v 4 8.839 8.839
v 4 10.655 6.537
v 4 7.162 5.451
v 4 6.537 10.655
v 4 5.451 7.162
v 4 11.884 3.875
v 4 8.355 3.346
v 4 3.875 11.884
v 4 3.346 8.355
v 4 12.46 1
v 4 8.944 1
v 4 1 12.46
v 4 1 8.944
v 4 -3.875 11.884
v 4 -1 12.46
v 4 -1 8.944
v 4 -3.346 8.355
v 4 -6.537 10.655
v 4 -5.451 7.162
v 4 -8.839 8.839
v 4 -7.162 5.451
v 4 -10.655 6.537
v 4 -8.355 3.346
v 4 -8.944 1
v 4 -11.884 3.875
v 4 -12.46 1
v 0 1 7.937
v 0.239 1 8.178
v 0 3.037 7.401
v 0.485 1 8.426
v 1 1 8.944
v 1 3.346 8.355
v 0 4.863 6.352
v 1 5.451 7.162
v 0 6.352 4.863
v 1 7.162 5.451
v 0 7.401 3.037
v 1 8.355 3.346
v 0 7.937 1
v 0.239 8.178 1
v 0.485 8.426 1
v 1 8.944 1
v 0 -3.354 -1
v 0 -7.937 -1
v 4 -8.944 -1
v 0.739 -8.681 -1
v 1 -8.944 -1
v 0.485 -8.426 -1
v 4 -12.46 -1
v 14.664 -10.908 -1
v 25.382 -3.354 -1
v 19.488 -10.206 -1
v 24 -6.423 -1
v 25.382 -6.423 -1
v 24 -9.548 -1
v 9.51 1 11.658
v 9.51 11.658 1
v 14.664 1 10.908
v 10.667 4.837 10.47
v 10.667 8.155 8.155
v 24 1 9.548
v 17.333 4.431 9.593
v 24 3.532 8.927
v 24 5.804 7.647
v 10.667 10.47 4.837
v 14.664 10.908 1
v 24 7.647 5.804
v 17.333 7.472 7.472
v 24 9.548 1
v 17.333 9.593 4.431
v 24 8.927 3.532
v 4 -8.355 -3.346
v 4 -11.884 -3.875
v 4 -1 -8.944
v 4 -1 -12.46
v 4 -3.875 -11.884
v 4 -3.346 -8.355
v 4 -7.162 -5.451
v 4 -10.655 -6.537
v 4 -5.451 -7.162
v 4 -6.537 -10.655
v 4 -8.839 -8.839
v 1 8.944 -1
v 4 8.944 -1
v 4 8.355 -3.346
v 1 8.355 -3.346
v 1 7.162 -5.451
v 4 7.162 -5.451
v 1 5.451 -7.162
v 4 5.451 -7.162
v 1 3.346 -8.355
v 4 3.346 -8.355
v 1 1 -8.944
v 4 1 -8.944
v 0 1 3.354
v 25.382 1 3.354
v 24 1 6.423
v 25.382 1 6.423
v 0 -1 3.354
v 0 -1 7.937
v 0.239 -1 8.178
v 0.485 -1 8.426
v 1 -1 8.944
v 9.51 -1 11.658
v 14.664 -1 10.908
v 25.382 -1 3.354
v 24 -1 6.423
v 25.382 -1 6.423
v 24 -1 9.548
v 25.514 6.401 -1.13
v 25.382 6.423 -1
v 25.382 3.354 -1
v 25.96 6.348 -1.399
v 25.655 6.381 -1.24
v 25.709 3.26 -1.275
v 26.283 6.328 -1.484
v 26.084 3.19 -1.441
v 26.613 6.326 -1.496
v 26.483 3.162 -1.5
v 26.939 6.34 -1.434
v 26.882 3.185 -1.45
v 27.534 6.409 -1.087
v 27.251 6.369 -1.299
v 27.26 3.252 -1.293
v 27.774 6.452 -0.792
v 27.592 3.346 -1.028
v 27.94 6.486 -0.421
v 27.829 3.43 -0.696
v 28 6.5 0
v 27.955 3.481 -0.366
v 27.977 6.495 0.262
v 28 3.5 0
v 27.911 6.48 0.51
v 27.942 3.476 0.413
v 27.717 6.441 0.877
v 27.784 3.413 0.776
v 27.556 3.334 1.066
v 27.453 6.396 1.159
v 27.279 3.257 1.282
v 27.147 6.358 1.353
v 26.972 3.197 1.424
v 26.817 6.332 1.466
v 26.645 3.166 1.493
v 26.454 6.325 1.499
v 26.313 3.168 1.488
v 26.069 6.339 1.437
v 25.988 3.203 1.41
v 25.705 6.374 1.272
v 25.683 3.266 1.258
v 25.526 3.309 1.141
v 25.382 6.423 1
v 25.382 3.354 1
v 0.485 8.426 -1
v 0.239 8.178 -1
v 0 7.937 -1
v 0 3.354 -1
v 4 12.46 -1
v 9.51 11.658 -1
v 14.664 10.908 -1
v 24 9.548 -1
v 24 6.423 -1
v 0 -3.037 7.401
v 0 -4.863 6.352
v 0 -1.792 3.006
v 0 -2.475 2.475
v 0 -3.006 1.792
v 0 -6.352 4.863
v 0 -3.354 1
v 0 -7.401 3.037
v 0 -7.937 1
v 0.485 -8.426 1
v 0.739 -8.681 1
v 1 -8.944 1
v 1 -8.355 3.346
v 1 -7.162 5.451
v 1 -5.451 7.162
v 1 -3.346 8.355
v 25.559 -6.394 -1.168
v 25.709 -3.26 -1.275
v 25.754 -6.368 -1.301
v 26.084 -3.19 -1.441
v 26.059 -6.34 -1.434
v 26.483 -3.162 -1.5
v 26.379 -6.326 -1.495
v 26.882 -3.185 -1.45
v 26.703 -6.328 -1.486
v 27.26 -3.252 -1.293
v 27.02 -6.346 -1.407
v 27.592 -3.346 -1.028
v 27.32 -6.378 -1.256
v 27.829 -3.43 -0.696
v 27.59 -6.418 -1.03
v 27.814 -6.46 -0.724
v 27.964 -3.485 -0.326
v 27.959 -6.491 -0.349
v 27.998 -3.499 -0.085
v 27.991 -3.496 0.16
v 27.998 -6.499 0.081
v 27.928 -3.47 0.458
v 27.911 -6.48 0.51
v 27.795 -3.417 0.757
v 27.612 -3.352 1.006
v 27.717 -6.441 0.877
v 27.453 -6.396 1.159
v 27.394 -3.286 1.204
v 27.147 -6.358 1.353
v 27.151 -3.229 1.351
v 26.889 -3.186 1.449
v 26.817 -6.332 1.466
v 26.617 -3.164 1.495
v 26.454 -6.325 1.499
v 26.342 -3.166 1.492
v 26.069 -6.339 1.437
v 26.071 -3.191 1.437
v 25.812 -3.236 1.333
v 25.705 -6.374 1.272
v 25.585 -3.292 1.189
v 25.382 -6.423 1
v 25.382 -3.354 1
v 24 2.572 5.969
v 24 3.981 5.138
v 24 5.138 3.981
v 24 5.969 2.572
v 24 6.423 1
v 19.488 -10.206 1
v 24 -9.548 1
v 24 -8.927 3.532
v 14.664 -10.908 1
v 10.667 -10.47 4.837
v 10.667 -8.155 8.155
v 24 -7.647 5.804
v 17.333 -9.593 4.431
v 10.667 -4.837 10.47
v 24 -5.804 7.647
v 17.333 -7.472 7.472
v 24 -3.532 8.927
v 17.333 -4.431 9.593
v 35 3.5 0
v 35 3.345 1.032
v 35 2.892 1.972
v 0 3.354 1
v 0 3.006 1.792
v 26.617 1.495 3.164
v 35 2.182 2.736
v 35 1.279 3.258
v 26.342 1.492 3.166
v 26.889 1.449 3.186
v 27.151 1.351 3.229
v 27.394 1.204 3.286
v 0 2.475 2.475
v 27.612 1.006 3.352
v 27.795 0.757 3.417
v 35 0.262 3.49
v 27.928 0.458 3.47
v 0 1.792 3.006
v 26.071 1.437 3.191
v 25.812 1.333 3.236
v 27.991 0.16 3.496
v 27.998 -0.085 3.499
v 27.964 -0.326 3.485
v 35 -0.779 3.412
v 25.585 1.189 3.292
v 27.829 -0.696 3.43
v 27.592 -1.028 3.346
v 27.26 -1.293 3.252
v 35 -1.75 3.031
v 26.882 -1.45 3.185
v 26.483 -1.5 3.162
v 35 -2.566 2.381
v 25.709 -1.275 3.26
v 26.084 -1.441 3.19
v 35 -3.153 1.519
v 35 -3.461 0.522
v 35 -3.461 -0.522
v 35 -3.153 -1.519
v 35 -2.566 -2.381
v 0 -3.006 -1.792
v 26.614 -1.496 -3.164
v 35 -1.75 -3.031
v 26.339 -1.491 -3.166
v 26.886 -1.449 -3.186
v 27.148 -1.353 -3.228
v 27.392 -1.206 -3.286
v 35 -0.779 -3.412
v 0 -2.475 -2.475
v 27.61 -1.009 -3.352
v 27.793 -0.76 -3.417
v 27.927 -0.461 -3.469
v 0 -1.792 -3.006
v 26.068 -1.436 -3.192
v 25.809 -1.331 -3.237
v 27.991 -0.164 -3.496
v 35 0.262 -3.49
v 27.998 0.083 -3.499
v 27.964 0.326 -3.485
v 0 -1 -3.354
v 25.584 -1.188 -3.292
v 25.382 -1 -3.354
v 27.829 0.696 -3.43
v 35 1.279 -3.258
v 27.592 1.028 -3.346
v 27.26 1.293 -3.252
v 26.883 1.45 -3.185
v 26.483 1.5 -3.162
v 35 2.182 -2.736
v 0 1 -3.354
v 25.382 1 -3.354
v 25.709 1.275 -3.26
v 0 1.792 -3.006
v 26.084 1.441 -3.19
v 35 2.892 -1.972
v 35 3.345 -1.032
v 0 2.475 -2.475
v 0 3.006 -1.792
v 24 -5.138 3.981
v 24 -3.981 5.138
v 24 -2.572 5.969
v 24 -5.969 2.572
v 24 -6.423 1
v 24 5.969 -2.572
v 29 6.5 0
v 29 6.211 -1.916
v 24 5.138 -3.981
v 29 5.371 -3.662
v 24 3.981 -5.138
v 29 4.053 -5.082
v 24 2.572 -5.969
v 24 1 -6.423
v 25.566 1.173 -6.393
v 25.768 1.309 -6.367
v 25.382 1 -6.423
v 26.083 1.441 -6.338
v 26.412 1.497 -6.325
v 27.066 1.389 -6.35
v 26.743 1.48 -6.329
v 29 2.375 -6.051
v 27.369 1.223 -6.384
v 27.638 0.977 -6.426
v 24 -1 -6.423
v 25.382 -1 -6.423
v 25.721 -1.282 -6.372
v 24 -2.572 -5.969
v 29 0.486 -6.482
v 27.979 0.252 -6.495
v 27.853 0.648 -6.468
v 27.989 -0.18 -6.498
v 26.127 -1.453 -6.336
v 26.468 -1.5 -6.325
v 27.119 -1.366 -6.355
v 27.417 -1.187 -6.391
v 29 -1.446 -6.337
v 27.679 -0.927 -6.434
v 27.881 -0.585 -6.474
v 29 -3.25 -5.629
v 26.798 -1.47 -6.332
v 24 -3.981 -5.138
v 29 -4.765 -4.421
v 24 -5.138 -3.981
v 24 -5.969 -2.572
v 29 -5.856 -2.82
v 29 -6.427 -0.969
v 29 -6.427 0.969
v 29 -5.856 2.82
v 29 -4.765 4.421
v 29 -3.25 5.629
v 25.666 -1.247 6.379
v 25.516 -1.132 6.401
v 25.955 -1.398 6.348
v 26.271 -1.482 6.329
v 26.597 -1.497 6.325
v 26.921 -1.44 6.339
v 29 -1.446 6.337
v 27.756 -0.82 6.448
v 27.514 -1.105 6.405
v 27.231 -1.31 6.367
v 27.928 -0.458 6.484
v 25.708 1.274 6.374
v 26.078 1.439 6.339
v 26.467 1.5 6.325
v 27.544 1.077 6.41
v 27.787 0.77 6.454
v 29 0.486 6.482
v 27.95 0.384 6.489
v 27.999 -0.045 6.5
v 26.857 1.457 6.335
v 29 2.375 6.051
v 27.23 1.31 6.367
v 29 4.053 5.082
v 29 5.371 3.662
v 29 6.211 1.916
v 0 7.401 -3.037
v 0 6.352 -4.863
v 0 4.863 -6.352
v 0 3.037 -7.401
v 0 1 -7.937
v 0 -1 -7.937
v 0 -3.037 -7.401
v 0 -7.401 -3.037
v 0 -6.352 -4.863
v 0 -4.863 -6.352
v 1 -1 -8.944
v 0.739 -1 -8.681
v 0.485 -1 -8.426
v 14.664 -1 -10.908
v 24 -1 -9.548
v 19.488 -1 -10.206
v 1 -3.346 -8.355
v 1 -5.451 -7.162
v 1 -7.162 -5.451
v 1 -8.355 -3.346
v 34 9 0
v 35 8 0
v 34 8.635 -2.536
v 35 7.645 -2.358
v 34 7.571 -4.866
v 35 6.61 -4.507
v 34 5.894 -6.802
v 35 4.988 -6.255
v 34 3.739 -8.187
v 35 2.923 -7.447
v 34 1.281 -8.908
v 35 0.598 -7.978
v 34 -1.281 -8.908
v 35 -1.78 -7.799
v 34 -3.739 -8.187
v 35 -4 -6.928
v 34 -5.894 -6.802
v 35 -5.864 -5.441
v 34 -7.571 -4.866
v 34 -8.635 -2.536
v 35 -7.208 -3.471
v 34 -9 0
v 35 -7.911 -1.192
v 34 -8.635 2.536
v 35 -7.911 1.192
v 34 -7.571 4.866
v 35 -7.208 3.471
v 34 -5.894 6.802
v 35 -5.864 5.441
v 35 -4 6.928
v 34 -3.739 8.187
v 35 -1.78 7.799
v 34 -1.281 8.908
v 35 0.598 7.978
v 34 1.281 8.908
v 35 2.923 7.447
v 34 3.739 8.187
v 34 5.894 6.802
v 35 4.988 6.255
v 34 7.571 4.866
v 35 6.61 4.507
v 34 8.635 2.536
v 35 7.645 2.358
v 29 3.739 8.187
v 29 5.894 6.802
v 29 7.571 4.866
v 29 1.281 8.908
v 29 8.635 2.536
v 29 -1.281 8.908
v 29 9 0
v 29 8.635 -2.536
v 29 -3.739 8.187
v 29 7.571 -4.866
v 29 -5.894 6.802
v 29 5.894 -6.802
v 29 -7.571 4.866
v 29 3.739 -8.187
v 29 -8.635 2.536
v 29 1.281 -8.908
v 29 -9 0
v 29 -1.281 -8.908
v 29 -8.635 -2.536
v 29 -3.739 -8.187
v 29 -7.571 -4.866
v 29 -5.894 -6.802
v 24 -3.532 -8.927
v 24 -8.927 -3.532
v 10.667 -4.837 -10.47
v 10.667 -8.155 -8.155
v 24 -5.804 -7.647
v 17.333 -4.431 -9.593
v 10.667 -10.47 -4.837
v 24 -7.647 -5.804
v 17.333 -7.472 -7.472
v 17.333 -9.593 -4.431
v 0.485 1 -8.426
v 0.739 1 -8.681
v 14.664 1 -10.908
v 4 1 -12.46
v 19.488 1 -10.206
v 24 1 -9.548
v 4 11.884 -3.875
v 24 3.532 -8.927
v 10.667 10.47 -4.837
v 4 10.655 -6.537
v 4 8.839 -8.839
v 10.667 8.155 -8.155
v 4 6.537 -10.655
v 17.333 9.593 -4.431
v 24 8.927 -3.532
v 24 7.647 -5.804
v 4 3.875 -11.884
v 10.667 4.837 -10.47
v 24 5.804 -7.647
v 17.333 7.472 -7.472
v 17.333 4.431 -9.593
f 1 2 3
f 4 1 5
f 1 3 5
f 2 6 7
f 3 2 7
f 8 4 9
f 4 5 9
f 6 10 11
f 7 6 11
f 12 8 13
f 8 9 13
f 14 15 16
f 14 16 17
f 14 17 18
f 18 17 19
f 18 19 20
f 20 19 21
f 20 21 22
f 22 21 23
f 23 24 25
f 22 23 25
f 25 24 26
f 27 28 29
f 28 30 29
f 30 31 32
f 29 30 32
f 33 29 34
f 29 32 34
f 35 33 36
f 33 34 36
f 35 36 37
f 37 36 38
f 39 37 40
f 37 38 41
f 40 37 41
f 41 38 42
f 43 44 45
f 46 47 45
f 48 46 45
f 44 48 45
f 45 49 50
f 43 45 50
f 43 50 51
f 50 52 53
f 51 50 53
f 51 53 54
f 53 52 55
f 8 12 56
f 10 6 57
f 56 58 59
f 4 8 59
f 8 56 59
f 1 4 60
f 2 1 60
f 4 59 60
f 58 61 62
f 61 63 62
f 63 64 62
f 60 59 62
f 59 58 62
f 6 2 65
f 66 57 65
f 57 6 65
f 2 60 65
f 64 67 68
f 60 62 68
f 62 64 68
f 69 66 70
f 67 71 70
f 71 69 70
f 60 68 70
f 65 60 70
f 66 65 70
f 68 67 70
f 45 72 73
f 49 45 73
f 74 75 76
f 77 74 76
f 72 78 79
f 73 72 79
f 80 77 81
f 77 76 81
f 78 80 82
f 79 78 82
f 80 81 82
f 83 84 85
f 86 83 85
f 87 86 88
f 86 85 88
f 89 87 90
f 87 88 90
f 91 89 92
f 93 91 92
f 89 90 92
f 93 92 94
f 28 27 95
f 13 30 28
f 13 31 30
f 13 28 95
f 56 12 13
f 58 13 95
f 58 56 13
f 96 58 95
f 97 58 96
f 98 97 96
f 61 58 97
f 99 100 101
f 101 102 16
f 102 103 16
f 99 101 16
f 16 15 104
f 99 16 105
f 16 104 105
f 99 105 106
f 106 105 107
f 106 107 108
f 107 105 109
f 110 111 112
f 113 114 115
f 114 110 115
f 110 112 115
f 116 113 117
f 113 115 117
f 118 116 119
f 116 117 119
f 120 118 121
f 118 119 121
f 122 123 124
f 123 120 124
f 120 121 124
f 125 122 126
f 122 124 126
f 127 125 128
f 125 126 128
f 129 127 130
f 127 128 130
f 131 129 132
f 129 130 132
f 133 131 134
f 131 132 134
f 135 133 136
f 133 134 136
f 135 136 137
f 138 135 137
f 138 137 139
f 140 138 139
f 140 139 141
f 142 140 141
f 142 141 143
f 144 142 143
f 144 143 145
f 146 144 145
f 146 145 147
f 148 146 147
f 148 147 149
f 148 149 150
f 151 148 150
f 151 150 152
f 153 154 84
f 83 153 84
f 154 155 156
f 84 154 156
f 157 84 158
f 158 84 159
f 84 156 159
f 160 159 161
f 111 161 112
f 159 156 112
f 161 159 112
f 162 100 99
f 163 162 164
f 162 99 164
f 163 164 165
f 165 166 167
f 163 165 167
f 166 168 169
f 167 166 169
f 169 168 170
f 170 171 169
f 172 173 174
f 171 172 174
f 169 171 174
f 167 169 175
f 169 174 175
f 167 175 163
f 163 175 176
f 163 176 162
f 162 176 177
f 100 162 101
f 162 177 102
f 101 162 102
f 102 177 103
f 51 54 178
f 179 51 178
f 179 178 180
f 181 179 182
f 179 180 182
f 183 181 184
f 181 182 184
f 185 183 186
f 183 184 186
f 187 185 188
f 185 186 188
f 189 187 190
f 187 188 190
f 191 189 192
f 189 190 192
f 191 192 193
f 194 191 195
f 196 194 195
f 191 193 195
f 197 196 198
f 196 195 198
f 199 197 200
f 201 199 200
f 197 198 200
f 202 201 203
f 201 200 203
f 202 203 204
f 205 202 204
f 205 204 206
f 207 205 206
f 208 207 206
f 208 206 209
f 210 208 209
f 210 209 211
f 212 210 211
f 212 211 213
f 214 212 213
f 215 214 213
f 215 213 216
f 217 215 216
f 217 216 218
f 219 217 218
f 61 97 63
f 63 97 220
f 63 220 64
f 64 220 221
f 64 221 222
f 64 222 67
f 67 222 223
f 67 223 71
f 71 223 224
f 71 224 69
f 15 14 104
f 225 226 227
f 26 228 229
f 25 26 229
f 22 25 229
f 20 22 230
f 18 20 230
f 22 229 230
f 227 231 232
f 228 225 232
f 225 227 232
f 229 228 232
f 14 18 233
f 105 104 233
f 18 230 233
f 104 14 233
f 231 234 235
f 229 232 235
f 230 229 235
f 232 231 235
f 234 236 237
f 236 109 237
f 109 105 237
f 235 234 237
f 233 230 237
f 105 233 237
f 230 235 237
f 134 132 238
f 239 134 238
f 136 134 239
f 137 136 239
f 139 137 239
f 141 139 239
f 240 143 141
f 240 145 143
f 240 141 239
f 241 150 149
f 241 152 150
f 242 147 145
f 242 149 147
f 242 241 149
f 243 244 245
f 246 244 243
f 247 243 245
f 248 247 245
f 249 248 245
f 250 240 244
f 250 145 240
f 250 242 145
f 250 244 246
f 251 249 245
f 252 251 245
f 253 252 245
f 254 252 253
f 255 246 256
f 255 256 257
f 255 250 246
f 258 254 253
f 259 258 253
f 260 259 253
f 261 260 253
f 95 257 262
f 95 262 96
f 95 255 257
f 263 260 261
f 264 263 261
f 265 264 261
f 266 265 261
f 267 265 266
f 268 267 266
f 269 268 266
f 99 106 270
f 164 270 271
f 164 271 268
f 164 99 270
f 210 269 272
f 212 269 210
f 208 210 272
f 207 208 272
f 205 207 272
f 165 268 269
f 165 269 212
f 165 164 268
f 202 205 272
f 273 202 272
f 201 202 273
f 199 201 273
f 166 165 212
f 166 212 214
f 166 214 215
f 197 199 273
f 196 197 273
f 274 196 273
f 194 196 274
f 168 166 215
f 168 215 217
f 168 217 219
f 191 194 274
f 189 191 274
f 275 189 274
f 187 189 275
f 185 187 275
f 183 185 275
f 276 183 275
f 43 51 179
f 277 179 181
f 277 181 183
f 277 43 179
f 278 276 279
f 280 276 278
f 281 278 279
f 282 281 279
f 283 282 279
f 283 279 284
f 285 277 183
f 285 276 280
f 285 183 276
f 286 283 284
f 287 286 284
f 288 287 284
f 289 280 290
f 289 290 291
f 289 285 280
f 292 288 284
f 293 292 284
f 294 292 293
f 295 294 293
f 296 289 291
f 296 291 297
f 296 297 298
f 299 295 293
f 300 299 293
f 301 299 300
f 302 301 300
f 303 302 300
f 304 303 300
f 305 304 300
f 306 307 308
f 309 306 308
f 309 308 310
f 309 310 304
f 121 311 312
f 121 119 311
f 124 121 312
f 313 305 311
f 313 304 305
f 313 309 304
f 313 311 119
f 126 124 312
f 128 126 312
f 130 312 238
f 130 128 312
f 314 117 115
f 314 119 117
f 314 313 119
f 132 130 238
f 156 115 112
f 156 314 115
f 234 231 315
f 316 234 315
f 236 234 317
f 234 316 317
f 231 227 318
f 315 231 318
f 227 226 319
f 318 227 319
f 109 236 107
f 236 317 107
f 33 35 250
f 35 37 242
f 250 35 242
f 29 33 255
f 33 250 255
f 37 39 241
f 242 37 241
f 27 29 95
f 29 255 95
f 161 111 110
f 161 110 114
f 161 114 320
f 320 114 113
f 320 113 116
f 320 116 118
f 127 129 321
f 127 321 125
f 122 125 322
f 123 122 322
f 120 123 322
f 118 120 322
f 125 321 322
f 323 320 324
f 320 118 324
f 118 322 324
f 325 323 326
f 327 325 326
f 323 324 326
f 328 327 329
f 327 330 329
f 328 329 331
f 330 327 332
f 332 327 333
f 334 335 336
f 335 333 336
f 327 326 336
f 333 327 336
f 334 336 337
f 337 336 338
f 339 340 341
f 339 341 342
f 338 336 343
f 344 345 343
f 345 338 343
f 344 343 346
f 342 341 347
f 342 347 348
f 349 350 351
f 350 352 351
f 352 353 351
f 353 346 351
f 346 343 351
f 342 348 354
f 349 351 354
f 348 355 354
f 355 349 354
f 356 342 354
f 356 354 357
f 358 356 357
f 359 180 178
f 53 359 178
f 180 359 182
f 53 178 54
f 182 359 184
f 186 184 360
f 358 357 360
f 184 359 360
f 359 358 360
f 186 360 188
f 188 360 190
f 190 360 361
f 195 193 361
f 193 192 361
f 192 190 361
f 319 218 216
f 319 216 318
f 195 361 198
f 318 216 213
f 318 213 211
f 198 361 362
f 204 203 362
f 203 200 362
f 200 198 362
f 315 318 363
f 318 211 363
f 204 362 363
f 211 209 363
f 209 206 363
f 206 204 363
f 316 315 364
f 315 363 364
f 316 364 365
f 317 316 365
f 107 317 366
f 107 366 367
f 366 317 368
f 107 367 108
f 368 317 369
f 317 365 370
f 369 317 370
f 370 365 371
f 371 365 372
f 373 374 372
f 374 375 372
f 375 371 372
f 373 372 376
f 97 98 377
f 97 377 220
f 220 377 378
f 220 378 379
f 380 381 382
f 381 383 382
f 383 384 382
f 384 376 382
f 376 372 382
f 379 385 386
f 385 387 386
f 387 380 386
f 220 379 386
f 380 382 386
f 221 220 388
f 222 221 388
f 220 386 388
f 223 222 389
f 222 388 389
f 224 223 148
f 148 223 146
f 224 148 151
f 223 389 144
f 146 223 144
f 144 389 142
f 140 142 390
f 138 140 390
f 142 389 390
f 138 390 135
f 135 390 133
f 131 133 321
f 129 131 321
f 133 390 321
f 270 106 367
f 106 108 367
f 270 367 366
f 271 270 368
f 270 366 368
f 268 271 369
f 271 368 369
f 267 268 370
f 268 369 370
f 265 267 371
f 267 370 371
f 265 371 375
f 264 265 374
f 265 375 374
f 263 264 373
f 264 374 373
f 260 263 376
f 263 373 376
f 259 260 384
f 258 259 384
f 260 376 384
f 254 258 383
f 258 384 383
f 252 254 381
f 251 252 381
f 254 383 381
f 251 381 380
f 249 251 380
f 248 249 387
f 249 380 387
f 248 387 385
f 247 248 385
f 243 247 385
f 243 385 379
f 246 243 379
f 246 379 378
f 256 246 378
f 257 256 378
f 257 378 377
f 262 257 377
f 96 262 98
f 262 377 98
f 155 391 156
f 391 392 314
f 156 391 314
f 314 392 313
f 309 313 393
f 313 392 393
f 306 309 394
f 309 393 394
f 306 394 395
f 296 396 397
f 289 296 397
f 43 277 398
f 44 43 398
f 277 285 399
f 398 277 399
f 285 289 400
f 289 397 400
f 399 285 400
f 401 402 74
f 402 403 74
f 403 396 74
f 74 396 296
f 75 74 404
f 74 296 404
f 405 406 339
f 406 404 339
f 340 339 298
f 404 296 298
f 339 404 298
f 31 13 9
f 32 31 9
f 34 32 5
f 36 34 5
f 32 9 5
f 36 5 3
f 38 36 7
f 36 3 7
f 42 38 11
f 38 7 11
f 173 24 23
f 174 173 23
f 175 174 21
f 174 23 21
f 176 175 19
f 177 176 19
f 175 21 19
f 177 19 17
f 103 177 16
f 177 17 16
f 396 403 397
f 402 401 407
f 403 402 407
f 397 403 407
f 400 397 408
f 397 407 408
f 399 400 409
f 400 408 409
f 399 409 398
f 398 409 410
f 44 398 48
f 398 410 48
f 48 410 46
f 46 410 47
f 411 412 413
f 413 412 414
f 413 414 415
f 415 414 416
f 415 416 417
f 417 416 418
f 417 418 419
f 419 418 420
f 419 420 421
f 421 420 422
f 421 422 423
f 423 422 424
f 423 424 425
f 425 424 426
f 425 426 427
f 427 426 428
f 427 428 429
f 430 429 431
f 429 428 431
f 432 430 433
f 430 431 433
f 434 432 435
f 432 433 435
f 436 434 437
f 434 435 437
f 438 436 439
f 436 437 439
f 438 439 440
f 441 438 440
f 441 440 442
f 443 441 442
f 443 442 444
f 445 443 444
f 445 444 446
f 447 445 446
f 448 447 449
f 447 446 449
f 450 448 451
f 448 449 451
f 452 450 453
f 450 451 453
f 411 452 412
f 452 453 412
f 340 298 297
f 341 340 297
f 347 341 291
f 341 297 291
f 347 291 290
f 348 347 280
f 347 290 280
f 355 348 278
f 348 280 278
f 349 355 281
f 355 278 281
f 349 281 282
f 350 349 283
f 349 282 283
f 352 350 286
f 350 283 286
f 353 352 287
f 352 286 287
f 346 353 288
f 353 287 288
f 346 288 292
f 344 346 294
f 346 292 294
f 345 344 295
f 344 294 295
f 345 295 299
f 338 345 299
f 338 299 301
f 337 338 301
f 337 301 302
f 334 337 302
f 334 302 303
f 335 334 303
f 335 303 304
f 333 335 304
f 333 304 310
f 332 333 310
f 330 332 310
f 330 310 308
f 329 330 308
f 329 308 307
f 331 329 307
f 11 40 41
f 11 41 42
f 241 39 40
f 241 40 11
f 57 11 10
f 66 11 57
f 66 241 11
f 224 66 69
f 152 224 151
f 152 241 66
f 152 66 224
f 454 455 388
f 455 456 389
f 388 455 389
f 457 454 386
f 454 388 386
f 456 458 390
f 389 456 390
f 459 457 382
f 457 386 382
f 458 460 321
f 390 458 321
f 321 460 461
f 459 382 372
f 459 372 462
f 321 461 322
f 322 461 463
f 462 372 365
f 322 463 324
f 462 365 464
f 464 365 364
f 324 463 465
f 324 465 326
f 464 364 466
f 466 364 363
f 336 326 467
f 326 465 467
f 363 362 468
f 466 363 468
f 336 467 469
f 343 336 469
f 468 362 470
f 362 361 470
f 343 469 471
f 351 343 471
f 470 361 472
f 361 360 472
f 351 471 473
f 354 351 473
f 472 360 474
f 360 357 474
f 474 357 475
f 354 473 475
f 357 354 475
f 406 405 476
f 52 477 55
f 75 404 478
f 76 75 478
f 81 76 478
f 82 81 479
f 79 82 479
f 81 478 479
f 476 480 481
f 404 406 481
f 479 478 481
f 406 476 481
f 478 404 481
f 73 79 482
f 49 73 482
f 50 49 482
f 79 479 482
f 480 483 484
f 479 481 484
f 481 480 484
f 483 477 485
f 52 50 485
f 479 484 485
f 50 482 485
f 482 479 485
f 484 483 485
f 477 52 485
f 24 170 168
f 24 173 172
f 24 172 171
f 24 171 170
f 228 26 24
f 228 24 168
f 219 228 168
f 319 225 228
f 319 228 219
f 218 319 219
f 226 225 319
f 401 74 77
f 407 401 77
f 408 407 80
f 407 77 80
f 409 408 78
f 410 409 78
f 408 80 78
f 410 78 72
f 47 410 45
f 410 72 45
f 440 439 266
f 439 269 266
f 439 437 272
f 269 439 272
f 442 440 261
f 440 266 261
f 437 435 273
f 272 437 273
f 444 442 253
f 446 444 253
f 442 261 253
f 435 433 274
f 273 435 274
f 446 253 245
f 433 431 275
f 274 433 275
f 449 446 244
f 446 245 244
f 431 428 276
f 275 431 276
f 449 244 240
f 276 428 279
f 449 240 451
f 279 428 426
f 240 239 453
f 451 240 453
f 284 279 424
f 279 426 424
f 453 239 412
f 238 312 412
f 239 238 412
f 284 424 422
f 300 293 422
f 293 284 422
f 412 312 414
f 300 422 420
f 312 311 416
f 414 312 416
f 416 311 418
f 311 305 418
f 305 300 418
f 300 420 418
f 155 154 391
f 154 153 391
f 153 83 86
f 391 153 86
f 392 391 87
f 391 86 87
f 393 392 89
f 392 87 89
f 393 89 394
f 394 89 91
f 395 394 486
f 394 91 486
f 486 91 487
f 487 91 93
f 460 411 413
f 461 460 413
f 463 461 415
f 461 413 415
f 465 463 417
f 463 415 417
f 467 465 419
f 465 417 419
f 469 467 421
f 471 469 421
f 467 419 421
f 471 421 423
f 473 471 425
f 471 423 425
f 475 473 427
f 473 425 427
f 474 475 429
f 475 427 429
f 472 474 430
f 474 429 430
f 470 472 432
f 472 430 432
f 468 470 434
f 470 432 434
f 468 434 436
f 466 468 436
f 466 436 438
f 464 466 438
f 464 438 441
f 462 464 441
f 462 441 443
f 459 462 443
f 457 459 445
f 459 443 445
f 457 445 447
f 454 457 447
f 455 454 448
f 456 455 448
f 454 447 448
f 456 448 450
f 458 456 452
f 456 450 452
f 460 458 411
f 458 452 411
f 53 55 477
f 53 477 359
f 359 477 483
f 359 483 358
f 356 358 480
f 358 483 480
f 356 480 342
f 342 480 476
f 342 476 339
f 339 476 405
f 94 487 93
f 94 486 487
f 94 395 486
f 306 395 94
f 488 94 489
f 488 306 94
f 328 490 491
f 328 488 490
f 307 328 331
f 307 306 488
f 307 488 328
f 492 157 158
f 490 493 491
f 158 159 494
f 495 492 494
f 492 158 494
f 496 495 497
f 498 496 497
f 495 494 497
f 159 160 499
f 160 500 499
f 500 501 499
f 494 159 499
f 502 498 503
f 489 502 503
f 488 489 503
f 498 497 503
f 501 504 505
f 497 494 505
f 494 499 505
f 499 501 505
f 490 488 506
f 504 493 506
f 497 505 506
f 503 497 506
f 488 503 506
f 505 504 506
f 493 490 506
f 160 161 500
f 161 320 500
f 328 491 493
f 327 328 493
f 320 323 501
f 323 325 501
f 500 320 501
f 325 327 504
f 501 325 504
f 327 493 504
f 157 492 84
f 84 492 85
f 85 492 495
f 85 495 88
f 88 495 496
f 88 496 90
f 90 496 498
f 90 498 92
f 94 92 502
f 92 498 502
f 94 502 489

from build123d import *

# Parameters (mm, degrees)
CHAMFER_1_SIZE           = 1
SKETCH_2_R               = 1.5
CUT_EXTRUDE_1_DEPTH      = 40.210967853
SKETCH_3_W               = 30.067866829
SKETCH_3_H               = 2
CUT_EXTRUDE_1_2_DEPTH    = 40.210967853
PATTERN_CIRCULAR_1_COUNT = 4
CUT_EXTRUDE_2_DEPTH      = 40.185456486
CUT_EXTRUDE_2_DEPTH_BACK = 40.185456486
SKETCH_4_R               = 3.5


with BuildPart() as part:
    # 草图1 → 旋转1 (revolve)
    with BuildSketch(Plane.XY):
        Polygon((0, 0), (0, 9), (4, 9), (4, 12.5), (24, 9.60013801), (24, 6.5), (29, 6.5), (29, 9), (35, 9), (35, 0), align=None)
    revolve(axis=Axis((35, 0, 0), (-1, 0, 0)))

    # 倒角1
    chamfer_1_edges = [part.edges().sort_by_distance(p)[0] for p in [
        (0, -9, 0),
        (35, -9, 0),
    ]]
    chamfer(chamfer_1_edges, length=CHAMFER_1_SIZE)

    # 草图2 → Cut-Extrude 1 (cut, symmetric)
    with BuildSketch(Plane.XY):
        with Locations((26.5, 0)):
            Circle(SKETCH_2_R)
    cut_extrude_1 = extrude(amount=CUT_EXTRUDE_1_DEPTH, both=True, mode=Mode.SUBTRACT)

    # 草图3 → Cut-Extrude 1 2 (cut, symmetric)
    with BuildSketch(Plane.XY):
        with Locations((11.466066586, 0)):
            Rectangle(SKETCH_3_W, SKETCH_3_H)
    cut_extrude_1_2 = extrude(amount=CUT_EXTRUDE_1_2_DEPTH, both=True, mode=Mode.SUBTRACT)

    # 阵列(圆周)1: Cut-Extrude 1, Cut-Extrude 1 2 ×4 about axis
    pattern_circular_1_axis = Axis((35, 0, 0), (1, 0, 0))
    add([cut_extrude_1.rotate(pattern_circular_1_axis, i * 360 / PATTERN_CIRCULAR_1_COUNT) for i in range(1, PATTERN_CIRCULAR_1_COUNT)], mode=Mode.SUBTRACT)
    add([cut_extrude_1_2.rotate(pattern_circular_1_axis, i * 360 / PATTERN_CIRCULAR_1_COUNT) for i in range(1, PATTERN_CIRCULAR_1_COUNT)], mode=Mode.SUBTRACT)

    # 草图4 → 切除-拉伸2 (cut, two sides: drawn at the far end of the back side and taken through both)
    with BuildSketch(Plane(origin=(35, 0, 0), x_dir=(0, 0, -1), z_dir=(1, 0, 0)).offset(-CUT_EXTRUDE_2_DEPTH_BACK)):
        with Locations(Location((0, 0, 0), (0, 0, 90))):
            Circle(SKETCH_4_R)
    extrude(amount=CUT_EXTRUDE_2_DEPTH + CUT_EXTRUDE_2_DEPTH_BACK, mode=Mode.SUBTRACT)


solid = part.part
